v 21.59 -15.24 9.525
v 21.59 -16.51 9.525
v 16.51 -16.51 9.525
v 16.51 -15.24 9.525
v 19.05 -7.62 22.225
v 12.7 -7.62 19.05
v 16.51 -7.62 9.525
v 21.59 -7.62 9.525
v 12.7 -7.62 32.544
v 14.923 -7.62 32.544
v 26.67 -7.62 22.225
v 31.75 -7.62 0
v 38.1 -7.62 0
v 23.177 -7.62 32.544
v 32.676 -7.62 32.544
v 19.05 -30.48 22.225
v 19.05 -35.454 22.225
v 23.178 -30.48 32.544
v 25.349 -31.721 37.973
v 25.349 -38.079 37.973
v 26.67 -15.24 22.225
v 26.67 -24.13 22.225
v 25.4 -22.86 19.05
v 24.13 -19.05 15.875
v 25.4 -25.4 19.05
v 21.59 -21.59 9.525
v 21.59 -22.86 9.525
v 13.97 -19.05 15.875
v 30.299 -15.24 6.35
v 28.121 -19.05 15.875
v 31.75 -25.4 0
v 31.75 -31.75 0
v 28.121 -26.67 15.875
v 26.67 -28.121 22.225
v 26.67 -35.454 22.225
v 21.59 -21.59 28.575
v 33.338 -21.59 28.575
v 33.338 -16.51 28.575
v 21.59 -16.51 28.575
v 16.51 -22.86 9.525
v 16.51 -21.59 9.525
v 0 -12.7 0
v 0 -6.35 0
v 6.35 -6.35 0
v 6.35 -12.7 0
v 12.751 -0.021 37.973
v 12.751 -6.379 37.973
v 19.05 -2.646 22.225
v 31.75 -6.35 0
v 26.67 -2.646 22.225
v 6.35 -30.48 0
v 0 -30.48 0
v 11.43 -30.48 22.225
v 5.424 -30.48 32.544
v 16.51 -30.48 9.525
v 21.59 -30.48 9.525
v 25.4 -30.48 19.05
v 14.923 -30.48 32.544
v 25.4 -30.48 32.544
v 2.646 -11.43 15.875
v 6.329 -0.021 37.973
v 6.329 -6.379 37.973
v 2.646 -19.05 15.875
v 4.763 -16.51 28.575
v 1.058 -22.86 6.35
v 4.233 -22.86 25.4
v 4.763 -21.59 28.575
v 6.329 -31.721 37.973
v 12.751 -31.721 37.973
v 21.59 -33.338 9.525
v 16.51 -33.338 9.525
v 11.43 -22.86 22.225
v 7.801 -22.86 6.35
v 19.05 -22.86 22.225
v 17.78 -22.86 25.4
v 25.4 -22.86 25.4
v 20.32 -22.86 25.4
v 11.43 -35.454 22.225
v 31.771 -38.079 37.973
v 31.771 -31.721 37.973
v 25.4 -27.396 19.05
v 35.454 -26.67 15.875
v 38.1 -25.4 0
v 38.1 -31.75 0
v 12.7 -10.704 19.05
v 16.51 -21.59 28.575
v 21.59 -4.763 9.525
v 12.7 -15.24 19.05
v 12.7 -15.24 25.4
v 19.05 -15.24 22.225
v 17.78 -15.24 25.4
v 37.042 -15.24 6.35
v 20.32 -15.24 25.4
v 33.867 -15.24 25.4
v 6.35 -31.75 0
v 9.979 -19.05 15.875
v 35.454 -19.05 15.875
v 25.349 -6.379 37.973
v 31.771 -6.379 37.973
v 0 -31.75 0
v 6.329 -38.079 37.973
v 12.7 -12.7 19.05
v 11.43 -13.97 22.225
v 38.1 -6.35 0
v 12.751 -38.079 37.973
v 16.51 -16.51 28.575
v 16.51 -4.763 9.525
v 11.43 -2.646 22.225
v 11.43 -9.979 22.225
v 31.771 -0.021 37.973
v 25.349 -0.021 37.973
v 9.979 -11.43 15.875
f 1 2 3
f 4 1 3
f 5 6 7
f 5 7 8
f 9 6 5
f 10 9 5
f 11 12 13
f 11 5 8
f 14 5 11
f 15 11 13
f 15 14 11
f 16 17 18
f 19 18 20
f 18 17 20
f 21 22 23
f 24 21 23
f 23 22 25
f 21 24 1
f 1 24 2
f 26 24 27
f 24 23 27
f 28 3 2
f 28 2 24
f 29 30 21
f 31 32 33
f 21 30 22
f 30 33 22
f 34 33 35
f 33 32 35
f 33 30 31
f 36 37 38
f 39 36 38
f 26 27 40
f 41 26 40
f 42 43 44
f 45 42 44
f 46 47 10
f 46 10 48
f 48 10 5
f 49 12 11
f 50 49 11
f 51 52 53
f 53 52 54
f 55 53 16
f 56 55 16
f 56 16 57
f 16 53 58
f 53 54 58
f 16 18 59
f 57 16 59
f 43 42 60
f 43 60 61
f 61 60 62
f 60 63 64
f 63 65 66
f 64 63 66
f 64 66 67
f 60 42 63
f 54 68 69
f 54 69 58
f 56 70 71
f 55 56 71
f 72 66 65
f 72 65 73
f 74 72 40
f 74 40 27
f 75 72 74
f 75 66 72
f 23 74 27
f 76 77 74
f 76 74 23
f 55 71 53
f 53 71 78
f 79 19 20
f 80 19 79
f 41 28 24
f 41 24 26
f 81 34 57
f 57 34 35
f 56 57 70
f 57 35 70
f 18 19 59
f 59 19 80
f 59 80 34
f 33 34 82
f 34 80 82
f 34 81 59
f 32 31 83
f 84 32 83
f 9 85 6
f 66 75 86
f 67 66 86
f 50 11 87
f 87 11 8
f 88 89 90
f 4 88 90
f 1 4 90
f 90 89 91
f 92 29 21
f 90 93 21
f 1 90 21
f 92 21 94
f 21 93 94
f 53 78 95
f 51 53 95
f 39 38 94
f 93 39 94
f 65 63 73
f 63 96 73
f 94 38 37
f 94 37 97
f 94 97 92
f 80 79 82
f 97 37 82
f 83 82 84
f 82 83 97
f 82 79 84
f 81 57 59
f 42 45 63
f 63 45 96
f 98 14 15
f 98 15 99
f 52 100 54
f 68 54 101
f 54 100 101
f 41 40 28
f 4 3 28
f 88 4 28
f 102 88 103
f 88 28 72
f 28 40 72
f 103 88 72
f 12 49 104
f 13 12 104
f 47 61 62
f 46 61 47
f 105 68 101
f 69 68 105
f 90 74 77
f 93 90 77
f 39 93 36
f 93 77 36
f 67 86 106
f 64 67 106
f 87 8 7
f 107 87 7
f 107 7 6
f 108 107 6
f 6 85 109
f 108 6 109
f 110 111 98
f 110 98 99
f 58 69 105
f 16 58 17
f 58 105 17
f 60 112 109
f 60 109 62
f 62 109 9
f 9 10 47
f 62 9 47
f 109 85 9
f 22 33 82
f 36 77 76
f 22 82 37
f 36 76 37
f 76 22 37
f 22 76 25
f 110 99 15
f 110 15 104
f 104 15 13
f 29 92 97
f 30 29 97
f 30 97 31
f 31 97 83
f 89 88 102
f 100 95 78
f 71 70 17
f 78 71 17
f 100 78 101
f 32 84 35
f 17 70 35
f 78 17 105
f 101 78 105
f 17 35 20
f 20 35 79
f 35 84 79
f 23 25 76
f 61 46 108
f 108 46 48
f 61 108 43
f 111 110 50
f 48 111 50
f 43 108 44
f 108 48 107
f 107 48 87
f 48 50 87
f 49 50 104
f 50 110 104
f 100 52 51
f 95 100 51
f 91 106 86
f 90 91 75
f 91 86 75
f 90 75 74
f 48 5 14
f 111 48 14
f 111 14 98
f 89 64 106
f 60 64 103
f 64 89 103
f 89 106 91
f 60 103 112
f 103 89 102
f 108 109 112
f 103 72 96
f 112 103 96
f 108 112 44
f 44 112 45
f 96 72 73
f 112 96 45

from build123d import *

# Parameters (mm, degrees)
F0_W      = 38.1
F0_H      = 37.973095
F1_DEPTH  = 38.1
F6_DEPTH  = 38.1
F8_DEPTH  = 38.1
F9_W      = 25.4
F9_H      = 7.62
F10_DEPTH = 38.1


with BuildPart() as f1:
    # F0 (on Front) → F1 (new body)
    with BuildSketch(Plane.XZ):
        with Locations((19.05, 18.986548)):
            Rectangle(F0_W, F0_H)
    extrude(amount=F1_DEPTH)

    # F5 (on offset) → F6 (cut)
    with BuildSketch(Plane.YZ.offset(38.1)):
        Polygon((-11.43, 15.875), (-6.35, 38.1), (-31.75, 38.1), (-26.67, 15.875), (-21.59, 28.575), (-16.51, 28.575), align=None)
        Polygon((-6.35, 0), (0, 0), (0, 38.1), align=None)
        Polygon((-25.4, 0), (-12.7, 0), (-19.05, 15.875), align=None)
        Polygon((-31.75, 0), (-38.1, 38.1), (-38.1, 0), align=None)
    extrude(amount=-F6_DEPTH, mode=Mode.SUBTRACT)

    # F7 (on offset) → F8 (cut)
    with BuildSketch(Plane.XZ.offset(38.1)):
        Polygon((11.43, 22.225), (6.35, 0), (31.75, 0), (26.67, 22.225), (21.59, 9.525), (16.51, 9.525), align=None)
        Polygon((25.4, 38.1), (12.7, 38.1), (19.05, 22.225), align=None)
        Polygon((31.75, 38.1), (38.1, 0), (38.1, 38.1), align=None)
        Polygon((0, 38.1), (0, 0), (6.35, 38.1), align=None)
    extrude(amount=-F8_DEPTH, mode=Mode.SUBTRACT)

    # F9 (on offset) → F10 (cut)
    with BuildSketch(Plane.XY.offset(38.1)):
        with Locations((25.4, -11.43)):
            Rectangle(F9_W, F9_H)
        with Locations((12.7, -26.67)):
            Rectangle(F9_W, F9_H)
    extrude(amount=-F10_DEPTH, mode=Mode.SUBTRACT)


solid = f1.part
